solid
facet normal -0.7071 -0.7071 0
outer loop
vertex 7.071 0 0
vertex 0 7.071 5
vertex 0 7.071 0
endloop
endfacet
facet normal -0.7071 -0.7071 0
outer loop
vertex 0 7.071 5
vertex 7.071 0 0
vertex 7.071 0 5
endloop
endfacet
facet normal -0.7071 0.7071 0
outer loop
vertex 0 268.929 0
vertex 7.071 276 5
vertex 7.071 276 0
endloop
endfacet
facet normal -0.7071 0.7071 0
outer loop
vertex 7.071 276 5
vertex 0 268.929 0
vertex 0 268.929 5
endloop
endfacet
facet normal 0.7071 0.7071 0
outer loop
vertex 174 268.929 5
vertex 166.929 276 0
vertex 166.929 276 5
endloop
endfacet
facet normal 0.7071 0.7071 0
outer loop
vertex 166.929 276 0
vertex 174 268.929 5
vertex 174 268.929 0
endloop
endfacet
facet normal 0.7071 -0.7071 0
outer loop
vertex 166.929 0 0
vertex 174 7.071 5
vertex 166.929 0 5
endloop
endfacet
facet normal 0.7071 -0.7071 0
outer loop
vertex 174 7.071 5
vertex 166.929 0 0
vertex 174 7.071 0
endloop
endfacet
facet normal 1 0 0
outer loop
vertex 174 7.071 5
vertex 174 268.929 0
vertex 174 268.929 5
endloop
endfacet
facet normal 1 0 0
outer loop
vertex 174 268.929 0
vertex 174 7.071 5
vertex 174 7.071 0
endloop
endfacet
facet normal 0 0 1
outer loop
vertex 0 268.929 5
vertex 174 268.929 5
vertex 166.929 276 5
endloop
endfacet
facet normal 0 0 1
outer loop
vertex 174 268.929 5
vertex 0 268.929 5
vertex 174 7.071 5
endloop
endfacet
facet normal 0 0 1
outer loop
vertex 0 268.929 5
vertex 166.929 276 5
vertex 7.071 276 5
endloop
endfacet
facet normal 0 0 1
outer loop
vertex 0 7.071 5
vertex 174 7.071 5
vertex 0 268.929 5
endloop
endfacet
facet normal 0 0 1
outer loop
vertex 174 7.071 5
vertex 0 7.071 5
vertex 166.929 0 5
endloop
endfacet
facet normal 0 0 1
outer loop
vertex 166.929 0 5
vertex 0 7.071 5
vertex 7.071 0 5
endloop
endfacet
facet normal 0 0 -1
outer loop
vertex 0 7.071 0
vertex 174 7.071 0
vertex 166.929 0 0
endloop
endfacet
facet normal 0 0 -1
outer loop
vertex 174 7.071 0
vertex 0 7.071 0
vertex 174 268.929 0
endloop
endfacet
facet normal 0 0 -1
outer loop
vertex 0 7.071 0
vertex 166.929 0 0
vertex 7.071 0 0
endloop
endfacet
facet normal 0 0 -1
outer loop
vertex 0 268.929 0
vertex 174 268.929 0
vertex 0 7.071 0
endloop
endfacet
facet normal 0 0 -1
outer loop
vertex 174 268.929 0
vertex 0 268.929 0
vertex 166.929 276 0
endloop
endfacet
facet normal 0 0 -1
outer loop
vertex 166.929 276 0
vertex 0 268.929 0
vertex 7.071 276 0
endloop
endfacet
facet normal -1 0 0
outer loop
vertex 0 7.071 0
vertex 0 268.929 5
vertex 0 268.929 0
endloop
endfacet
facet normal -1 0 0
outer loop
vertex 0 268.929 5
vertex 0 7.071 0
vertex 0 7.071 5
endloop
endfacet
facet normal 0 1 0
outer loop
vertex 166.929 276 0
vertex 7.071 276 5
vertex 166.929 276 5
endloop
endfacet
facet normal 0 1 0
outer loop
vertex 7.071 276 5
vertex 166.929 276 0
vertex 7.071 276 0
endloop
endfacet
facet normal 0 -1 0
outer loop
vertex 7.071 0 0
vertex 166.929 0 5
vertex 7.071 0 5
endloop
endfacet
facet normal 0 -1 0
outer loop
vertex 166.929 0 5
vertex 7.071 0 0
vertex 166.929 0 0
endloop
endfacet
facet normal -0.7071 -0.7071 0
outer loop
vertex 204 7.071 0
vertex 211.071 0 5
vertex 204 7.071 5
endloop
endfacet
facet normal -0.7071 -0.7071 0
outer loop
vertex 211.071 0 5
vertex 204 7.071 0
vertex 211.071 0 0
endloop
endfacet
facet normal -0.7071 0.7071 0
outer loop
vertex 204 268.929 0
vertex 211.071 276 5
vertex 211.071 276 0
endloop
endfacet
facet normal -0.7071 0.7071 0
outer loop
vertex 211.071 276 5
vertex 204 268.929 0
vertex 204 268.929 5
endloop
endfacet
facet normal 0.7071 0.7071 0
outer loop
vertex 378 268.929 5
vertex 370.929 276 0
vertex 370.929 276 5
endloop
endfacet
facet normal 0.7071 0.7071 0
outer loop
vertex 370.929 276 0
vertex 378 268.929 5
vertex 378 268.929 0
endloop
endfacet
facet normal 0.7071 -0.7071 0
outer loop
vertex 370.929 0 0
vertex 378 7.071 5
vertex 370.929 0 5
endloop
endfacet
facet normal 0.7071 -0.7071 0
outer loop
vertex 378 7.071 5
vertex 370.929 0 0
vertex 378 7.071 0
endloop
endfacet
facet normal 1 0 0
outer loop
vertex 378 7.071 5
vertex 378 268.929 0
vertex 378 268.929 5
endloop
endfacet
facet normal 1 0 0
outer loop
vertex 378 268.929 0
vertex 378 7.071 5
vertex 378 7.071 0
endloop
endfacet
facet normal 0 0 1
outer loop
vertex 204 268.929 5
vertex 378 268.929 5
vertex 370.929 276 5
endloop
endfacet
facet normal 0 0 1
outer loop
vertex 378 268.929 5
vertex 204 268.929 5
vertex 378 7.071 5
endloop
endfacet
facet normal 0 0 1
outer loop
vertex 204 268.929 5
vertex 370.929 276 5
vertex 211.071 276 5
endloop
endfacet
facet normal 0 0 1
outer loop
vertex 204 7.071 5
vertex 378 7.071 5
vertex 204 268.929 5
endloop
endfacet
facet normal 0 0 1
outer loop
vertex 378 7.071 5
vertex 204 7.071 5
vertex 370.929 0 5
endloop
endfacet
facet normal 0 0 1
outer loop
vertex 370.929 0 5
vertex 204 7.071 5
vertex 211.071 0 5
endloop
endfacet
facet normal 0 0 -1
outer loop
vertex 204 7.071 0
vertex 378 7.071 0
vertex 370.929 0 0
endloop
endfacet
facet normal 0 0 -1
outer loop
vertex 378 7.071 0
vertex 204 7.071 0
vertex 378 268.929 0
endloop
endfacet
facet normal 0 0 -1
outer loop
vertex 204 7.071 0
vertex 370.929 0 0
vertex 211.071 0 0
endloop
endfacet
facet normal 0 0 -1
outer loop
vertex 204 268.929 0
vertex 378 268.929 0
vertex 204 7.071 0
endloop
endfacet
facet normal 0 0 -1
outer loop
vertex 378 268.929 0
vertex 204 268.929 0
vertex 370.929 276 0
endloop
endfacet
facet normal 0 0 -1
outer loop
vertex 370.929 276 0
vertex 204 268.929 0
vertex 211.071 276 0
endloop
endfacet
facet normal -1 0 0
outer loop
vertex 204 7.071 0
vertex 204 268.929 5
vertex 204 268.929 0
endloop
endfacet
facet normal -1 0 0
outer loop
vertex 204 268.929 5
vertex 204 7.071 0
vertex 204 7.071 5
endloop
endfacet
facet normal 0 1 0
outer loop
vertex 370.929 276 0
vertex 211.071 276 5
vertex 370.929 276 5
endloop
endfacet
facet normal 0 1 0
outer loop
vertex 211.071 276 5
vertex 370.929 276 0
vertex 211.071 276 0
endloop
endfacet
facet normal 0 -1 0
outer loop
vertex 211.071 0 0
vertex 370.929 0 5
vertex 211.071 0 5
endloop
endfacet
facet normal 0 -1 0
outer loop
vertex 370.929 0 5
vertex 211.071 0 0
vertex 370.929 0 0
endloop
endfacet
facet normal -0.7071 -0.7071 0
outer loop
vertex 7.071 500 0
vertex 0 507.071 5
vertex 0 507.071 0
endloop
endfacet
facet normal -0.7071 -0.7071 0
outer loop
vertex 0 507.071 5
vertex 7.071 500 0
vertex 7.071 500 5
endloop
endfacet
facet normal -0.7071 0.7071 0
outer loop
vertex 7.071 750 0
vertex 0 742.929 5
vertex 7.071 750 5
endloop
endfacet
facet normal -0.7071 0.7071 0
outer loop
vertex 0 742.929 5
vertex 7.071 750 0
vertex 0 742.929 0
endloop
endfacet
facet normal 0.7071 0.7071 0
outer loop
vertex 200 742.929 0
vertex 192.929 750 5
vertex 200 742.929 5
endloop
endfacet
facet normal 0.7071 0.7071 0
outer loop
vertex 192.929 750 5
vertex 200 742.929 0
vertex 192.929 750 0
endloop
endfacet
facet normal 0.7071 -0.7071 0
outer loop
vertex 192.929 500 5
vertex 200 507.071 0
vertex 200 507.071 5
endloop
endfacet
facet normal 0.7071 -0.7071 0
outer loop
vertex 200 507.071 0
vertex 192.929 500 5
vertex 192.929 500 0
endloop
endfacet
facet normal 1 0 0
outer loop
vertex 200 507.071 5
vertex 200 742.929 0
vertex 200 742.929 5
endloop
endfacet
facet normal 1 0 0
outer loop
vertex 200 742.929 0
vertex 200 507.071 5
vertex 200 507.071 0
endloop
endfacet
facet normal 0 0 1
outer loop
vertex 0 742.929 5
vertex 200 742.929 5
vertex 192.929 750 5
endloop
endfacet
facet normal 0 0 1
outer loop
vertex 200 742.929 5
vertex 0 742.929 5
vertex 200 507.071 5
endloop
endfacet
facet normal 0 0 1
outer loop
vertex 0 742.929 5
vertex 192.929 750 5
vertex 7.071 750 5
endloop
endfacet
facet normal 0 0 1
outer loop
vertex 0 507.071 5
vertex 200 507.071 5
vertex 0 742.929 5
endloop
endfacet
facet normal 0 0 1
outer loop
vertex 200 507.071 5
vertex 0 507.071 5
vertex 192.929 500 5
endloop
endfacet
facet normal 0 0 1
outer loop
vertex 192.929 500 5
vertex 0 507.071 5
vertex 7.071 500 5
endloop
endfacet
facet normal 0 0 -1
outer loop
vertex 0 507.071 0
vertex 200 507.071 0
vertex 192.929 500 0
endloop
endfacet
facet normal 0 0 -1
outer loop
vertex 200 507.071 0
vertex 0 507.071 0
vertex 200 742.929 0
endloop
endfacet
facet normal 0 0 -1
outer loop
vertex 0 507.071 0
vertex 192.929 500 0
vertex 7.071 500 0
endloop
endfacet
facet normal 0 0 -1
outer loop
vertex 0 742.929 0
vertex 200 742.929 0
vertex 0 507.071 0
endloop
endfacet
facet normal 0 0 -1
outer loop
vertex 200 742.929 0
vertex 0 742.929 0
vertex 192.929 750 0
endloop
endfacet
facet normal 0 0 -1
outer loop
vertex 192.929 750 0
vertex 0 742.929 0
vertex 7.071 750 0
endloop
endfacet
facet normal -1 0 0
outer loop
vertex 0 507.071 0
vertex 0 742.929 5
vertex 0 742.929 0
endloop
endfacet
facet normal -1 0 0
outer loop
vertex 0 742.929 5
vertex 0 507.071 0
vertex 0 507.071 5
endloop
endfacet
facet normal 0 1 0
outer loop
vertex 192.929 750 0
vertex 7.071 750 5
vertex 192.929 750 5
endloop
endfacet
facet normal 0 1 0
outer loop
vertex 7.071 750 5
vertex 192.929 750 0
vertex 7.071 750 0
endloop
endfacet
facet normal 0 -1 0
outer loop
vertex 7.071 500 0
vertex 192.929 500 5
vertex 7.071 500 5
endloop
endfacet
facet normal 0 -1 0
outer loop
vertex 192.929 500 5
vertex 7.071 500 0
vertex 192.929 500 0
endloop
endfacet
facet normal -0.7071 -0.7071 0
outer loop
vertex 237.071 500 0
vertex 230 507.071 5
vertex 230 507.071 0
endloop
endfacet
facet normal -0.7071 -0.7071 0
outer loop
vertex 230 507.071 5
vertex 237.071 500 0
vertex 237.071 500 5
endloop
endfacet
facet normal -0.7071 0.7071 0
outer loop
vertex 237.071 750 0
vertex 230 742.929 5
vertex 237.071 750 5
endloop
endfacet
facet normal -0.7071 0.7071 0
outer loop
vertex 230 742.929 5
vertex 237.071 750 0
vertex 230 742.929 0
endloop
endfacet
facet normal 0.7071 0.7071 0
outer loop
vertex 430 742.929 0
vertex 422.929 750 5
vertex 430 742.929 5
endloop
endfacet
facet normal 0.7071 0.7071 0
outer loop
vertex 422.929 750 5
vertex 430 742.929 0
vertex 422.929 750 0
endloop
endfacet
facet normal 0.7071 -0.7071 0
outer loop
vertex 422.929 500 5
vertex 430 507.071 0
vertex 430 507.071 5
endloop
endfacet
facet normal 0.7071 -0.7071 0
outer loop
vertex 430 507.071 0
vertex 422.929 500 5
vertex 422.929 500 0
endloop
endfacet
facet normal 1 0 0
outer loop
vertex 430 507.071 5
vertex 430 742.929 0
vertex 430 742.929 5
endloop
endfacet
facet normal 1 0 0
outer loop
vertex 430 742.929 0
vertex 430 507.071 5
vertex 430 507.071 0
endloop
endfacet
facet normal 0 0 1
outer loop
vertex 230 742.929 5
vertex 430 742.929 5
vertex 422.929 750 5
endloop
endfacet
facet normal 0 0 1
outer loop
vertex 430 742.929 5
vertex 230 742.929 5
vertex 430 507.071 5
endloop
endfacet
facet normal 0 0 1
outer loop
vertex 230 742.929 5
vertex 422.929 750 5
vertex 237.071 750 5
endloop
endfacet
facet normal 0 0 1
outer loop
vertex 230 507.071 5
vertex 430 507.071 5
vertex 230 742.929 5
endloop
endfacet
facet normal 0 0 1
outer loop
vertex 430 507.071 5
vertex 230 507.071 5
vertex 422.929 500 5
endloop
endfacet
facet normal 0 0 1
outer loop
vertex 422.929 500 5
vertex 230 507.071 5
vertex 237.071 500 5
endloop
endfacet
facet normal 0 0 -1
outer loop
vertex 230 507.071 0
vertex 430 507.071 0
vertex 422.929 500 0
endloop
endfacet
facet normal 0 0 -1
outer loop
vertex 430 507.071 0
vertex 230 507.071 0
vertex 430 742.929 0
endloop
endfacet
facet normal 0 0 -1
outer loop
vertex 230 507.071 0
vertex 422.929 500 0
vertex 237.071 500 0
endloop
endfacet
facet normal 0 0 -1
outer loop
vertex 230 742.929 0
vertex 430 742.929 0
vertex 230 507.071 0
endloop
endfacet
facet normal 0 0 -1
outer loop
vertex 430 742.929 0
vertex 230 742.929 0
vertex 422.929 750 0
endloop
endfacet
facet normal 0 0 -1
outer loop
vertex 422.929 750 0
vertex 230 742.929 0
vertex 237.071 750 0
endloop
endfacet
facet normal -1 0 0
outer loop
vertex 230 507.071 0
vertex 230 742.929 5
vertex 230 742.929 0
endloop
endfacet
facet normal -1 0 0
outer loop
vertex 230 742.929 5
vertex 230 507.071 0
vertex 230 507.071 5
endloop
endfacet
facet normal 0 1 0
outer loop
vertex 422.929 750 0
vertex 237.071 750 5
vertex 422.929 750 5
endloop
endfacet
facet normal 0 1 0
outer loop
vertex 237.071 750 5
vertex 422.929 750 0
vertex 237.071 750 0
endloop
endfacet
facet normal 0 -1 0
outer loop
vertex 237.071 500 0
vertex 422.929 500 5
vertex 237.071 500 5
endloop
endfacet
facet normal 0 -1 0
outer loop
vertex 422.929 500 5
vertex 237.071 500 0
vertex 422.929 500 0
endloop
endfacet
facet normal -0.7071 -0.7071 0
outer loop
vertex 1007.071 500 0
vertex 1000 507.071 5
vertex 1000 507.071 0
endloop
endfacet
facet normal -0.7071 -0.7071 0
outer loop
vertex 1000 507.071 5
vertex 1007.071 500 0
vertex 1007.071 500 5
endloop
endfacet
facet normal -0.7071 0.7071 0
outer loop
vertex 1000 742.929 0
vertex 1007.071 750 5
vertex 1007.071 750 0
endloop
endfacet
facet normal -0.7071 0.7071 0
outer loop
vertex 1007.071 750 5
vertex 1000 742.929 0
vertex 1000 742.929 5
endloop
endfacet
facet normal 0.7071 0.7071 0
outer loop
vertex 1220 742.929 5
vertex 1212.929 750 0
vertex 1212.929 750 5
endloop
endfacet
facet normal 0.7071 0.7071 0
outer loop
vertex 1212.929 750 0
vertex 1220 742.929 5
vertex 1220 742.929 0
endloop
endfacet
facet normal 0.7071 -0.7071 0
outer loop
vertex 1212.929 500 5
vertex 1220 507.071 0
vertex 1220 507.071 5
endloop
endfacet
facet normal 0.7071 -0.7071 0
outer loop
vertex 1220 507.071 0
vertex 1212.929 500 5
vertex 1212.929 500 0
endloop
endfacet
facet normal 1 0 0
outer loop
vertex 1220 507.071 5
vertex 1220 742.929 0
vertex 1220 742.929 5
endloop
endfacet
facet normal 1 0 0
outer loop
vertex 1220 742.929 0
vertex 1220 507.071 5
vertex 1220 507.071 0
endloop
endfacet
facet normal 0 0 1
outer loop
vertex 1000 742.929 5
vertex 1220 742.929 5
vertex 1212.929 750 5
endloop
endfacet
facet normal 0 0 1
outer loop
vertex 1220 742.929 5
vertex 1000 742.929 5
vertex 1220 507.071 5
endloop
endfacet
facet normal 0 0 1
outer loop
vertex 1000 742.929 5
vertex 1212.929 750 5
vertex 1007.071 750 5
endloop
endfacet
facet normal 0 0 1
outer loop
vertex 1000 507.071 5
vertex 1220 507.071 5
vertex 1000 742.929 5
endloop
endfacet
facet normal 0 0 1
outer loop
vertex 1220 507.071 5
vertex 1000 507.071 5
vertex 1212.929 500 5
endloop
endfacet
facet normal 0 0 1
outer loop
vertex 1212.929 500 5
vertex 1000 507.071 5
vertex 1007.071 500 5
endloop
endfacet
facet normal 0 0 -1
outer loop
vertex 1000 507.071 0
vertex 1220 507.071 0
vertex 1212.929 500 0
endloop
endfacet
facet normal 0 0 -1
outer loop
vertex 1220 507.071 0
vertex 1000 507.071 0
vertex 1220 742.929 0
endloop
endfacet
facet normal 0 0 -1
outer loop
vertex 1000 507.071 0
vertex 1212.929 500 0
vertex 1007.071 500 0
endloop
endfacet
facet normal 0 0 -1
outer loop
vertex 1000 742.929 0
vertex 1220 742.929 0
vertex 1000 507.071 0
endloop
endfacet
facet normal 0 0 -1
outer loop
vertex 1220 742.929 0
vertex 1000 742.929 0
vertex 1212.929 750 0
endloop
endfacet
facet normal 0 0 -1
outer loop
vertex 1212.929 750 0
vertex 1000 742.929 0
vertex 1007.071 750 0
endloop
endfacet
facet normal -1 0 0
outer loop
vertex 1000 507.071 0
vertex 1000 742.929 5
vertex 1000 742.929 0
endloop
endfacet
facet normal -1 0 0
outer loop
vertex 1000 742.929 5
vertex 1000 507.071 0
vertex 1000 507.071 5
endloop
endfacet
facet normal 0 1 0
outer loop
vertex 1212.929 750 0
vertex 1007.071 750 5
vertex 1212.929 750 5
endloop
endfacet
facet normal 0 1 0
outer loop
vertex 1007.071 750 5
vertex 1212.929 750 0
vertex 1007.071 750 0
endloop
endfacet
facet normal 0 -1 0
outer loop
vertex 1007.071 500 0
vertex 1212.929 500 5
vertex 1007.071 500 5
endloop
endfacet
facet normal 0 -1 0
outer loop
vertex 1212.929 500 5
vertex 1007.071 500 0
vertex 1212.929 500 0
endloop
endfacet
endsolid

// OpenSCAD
include <../src/wardrobe.scad>;
cnc_slab_batch();
//github_openscad -o wardrobe_2/cnc_slab_batch.stl -D wardrobe_n=2 -D cutting_edge=0 -D break_view_length=0 wardrobe_2/cnc_slab_batch_stl.scad
